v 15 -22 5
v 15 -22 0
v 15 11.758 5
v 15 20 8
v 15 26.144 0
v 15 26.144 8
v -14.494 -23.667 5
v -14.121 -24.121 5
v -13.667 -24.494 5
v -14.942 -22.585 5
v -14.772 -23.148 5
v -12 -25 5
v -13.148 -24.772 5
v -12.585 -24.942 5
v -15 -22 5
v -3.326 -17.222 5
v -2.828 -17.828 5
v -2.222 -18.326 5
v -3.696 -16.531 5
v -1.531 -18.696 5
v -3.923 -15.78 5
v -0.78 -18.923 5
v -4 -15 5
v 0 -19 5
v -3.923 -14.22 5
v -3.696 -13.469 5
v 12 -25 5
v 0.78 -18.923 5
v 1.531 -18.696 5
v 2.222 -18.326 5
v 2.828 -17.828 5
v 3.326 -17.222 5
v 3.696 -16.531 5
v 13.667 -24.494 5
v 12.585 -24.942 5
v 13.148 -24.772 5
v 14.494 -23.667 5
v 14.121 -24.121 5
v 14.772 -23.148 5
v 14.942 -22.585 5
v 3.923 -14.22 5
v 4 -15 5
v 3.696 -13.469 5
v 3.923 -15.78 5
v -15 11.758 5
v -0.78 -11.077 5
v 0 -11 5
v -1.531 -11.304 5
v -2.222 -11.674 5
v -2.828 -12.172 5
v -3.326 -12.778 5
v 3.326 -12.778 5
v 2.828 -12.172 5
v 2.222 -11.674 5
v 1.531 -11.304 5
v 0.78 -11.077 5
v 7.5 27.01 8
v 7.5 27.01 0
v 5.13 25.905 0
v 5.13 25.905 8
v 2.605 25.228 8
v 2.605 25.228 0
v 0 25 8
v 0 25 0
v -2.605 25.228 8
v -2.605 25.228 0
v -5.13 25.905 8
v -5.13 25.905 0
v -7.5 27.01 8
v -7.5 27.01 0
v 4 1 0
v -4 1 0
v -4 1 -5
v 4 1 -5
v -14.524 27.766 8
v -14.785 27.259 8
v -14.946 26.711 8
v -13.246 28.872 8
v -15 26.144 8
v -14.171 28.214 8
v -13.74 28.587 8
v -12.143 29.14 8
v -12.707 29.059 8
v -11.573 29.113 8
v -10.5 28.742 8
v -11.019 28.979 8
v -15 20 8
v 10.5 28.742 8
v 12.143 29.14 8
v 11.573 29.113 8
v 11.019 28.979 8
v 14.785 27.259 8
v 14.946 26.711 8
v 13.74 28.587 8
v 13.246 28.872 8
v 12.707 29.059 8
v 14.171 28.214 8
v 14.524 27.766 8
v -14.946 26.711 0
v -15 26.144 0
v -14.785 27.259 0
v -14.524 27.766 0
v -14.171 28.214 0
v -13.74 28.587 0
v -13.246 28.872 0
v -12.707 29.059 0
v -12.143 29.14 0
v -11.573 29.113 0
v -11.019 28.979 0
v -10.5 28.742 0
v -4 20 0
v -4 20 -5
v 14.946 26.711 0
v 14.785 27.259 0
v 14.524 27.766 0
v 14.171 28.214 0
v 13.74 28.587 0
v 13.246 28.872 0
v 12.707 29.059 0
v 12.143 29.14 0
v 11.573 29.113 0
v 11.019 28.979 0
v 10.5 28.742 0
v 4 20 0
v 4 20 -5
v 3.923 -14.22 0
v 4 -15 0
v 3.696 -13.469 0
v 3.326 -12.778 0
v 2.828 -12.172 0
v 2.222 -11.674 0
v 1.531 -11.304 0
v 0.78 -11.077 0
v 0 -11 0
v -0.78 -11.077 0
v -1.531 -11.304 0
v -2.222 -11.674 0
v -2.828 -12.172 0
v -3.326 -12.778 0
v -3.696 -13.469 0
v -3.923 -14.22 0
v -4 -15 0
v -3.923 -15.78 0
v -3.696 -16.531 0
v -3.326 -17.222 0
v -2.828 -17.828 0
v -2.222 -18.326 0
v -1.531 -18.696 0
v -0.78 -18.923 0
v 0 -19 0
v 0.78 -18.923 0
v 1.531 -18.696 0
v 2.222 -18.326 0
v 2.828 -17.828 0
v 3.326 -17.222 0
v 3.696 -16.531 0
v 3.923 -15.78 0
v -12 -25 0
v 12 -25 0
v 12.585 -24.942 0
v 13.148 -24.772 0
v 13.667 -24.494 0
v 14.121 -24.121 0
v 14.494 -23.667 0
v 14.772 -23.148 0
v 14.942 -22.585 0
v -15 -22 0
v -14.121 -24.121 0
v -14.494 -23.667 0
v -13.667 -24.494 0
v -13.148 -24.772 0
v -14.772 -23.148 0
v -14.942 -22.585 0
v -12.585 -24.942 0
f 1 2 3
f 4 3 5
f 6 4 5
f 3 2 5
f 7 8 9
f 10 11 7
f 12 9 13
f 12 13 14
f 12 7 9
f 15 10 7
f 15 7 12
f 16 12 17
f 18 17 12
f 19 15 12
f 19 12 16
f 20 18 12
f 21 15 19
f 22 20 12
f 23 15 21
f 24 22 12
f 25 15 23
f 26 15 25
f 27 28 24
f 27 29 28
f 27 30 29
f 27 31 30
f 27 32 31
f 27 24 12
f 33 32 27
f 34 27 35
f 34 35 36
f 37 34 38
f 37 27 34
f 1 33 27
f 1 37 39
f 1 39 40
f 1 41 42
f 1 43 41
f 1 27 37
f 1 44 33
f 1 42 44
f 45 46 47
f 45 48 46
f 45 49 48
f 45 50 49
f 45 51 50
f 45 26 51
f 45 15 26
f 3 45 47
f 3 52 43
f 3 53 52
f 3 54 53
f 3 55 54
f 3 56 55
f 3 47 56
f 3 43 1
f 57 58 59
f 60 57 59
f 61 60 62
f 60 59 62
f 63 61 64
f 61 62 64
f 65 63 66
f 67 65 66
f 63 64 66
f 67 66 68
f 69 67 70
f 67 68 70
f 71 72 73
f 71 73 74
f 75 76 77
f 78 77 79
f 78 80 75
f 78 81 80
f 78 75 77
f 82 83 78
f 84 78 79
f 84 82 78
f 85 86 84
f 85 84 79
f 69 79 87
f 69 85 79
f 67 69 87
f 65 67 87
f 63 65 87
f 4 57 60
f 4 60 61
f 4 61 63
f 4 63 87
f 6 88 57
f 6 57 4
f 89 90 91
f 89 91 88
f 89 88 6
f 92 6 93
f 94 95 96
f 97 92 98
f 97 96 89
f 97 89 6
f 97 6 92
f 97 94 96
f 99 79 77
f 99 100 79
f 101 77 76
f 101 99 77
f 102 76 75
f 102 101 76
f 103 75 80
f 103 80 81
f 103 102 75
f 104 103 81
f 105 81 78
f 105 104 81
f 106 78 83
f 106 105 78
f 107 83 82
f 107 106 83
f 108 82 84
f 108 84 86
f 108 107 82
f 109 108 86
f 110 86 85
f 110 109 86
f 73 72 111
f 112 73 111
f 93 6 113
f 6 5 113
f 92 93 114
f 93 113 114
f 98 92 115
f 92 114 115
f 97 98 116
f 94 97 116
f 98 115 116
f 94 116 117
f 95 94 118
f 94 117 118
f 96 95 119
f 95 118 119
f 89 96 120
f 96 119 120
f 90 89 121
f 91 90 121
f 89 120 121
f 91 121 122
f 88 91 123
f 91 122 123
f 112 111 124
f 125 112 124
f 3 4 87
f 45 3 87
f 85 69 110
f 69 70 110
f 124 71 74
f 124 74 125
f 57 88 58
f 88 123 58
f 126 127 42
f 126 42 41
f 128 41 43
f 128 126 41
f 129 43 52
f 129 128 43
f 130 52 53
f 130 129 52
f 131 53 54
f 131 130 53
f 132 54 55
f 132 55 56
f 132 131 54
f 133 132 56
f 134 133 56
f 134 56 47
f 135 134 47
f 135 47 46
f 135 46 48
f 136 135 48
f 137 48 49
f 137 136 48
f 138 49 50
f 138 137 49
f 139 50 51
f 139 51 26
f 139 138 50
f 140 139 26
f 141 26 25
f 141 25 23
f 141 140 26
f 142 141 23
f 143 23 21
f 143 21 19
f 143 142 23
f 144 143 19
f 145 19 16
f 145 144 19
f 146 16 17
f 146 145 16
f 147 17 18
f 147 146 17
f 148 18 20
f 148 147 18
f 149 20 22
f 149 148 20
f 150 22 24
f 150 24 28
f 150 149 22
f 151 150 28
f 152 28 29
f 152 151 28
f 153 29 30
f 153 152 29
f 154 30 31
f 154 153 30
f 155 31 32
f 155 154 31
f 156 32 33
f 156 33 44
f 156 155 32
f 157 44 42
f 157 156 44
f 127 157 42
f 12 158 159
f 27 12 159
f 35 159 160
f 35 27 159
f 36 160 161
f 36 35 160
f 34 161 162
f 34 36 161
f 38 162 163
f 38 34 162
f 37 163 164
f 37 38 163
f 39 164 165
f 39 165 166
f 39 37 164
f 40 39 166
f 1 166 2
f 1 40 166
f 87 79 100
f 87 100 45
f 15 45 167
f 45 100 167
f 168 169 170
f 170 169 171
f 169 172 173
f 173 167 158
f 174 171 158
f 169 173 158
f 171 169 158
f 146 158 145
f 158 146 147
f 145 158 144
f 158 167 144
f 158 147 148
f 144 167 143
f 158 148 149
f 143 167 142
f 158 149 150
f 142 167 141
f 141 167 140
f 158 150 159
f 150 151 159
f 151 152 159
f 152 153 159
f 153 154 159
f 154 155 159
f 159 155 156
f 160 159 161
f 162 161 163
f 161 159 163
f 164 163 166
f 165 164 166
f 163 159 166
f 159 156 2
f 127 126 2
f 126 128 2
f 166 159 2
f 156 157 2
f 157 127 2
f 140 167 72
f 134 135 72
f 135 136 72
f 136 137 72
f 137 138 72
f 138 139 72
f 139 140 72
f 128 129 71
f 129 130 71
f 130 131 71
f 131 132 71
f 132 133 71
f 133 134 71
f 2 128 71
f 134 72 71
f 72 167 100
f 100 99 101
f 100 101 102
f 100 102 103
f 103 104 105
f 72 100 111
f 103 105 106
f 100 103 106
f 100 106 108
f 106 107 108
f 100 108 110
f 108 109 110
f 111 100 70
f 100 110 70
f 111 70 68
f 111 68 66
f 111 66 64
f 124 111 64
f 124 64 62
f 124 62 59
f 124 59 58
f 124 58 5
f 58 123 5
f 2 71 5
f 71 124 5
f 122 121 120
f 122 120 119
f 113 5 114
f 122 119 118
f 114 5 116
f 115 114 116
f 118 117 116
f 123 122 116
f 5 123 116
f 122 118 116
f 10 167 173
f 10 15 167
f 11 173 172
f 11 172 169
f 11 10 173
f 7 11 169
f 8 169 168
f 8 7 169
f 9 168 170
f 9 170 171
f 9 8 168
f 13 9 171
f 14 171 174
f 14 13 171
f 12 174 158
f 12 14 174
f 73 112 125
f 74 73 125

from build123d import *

# Parameters (mm, degrees)
F0_R     = 4
F0_W     = 8
F0_H     = 19
F1_DEPTH = 5
F0_H_2   = 1
F2_DEPTH = 8
F3_DEPTH = 5
F4_R     = 3
F5_SIZE2 = 2.99999
F5_SIZE  = 8.242422


# Not quite as in the source:
# - a fillet or chamfer is up to 0.001 mm smaller than in the source, because OpenCascade refuses the exact size


with BuildPart() as f1:
    # F0 (on Top) → F1 (new body)
    with BuildSketch(Plane.XY):
        Polygon((-15, 20), (-15, -25), (15, -25), (15, 20), (4, 20), (4, 1), (-4, 1), (-4, 20), align=None)
        with Locations((0, -15)):
            Circle(F0_R, mode=Mode.SUBTRACT)
        with Locations((0, 10.5)):
            Rectangle(F0_W, F0_H)
        with BuildLine():
            Line((-15, 25), (-15, 20))
            Line((-15, 20), (-4, 20))
            Line((-4, 20), (-4, 21))
            Line((-4, 21), (4, 21))
            Line((4, 21), (4, 20))
            Line((4, 20), (15, 20))
            Line((15, 20), (15, 25))
            Line((15, 25), (15, 31.3397459622))
            Line((15, 31.3397459622), (7.5, 27.0096189432))
            ThreePointArc((7.5, 27.0096189432), (0, 25), (-7.5, 27.0096189432))
            Line((-7.5, 27.0096189432), (-15, 31.3397459622))
            Line((-15, 31.3397459622), (-15, 25))
        make_face()
    extrude(amount=F1_DEPTH)

    # F0 (on Top) → F2 (join)
    with BuildSketch(Plane.XY):
        with Locations((0, 20.5)):
            Rectangle(F0_W, F0_H_2)
        with BuildLine():
            Line((-15, 25), (-15, 20))
            Line((-15, 20), (-4, 20))
            Line((-4, 20), (-4, 21))
            Line((-4, 21), (4, 21))
            Line((4, 21), (4, 20))
            Line((4, 20), (15, 20))
            Line((15, 20), (15, 25))
            Line((15, 25), (15, 31.3397459622))
            Line((15, 31.3397459622), (7.5, 27.0096189432))
            ThreePointArc((7.5, 27.0096189432), (0, 25), (-7.5, 27.0096189432))
            Line((-7.5, 27.0096189432), (-15, 31.3397459622))
            Line((-15, 31.3397459622), (-15, 25))
        make_face()
    extrude(amount=F2_DEPTH)

    # F0 (on Top) → F3 (join)
    with BuildSketch(Plane.XY):
        with Locations((0, 10.5)):
            Rectangle(F0_W, F0_H)
    extrude(amount=-F3_DEPTH)

    # F4
    f4_edges = [f1.edges().sort_by_distance(p)[0] for p in [
        (-15, 31.339746, 4),
        (15, 31.339746, 4),
        (-15, -25, 2.5),
        (15, -25, 2.5),
    ]]
    fillet(f4_edges, radius=F4_R)

    # F5 (size 8.2424322584 and 3 in the source; OpenCascade refuses exactly that, so slightly less here)
    f5_edges = [f1.edges().sort_by_distance(p)[0] for p in [
        (0, 20, 5),
    ]]
    f5_side = f1.faces().sort_by_distance((0, -1.950066, 5))[0]
    chamfer(f5_edges, length=F5_SIZE, length2=F5_SIZE2, reference=f5_side)


solid = f1.part
